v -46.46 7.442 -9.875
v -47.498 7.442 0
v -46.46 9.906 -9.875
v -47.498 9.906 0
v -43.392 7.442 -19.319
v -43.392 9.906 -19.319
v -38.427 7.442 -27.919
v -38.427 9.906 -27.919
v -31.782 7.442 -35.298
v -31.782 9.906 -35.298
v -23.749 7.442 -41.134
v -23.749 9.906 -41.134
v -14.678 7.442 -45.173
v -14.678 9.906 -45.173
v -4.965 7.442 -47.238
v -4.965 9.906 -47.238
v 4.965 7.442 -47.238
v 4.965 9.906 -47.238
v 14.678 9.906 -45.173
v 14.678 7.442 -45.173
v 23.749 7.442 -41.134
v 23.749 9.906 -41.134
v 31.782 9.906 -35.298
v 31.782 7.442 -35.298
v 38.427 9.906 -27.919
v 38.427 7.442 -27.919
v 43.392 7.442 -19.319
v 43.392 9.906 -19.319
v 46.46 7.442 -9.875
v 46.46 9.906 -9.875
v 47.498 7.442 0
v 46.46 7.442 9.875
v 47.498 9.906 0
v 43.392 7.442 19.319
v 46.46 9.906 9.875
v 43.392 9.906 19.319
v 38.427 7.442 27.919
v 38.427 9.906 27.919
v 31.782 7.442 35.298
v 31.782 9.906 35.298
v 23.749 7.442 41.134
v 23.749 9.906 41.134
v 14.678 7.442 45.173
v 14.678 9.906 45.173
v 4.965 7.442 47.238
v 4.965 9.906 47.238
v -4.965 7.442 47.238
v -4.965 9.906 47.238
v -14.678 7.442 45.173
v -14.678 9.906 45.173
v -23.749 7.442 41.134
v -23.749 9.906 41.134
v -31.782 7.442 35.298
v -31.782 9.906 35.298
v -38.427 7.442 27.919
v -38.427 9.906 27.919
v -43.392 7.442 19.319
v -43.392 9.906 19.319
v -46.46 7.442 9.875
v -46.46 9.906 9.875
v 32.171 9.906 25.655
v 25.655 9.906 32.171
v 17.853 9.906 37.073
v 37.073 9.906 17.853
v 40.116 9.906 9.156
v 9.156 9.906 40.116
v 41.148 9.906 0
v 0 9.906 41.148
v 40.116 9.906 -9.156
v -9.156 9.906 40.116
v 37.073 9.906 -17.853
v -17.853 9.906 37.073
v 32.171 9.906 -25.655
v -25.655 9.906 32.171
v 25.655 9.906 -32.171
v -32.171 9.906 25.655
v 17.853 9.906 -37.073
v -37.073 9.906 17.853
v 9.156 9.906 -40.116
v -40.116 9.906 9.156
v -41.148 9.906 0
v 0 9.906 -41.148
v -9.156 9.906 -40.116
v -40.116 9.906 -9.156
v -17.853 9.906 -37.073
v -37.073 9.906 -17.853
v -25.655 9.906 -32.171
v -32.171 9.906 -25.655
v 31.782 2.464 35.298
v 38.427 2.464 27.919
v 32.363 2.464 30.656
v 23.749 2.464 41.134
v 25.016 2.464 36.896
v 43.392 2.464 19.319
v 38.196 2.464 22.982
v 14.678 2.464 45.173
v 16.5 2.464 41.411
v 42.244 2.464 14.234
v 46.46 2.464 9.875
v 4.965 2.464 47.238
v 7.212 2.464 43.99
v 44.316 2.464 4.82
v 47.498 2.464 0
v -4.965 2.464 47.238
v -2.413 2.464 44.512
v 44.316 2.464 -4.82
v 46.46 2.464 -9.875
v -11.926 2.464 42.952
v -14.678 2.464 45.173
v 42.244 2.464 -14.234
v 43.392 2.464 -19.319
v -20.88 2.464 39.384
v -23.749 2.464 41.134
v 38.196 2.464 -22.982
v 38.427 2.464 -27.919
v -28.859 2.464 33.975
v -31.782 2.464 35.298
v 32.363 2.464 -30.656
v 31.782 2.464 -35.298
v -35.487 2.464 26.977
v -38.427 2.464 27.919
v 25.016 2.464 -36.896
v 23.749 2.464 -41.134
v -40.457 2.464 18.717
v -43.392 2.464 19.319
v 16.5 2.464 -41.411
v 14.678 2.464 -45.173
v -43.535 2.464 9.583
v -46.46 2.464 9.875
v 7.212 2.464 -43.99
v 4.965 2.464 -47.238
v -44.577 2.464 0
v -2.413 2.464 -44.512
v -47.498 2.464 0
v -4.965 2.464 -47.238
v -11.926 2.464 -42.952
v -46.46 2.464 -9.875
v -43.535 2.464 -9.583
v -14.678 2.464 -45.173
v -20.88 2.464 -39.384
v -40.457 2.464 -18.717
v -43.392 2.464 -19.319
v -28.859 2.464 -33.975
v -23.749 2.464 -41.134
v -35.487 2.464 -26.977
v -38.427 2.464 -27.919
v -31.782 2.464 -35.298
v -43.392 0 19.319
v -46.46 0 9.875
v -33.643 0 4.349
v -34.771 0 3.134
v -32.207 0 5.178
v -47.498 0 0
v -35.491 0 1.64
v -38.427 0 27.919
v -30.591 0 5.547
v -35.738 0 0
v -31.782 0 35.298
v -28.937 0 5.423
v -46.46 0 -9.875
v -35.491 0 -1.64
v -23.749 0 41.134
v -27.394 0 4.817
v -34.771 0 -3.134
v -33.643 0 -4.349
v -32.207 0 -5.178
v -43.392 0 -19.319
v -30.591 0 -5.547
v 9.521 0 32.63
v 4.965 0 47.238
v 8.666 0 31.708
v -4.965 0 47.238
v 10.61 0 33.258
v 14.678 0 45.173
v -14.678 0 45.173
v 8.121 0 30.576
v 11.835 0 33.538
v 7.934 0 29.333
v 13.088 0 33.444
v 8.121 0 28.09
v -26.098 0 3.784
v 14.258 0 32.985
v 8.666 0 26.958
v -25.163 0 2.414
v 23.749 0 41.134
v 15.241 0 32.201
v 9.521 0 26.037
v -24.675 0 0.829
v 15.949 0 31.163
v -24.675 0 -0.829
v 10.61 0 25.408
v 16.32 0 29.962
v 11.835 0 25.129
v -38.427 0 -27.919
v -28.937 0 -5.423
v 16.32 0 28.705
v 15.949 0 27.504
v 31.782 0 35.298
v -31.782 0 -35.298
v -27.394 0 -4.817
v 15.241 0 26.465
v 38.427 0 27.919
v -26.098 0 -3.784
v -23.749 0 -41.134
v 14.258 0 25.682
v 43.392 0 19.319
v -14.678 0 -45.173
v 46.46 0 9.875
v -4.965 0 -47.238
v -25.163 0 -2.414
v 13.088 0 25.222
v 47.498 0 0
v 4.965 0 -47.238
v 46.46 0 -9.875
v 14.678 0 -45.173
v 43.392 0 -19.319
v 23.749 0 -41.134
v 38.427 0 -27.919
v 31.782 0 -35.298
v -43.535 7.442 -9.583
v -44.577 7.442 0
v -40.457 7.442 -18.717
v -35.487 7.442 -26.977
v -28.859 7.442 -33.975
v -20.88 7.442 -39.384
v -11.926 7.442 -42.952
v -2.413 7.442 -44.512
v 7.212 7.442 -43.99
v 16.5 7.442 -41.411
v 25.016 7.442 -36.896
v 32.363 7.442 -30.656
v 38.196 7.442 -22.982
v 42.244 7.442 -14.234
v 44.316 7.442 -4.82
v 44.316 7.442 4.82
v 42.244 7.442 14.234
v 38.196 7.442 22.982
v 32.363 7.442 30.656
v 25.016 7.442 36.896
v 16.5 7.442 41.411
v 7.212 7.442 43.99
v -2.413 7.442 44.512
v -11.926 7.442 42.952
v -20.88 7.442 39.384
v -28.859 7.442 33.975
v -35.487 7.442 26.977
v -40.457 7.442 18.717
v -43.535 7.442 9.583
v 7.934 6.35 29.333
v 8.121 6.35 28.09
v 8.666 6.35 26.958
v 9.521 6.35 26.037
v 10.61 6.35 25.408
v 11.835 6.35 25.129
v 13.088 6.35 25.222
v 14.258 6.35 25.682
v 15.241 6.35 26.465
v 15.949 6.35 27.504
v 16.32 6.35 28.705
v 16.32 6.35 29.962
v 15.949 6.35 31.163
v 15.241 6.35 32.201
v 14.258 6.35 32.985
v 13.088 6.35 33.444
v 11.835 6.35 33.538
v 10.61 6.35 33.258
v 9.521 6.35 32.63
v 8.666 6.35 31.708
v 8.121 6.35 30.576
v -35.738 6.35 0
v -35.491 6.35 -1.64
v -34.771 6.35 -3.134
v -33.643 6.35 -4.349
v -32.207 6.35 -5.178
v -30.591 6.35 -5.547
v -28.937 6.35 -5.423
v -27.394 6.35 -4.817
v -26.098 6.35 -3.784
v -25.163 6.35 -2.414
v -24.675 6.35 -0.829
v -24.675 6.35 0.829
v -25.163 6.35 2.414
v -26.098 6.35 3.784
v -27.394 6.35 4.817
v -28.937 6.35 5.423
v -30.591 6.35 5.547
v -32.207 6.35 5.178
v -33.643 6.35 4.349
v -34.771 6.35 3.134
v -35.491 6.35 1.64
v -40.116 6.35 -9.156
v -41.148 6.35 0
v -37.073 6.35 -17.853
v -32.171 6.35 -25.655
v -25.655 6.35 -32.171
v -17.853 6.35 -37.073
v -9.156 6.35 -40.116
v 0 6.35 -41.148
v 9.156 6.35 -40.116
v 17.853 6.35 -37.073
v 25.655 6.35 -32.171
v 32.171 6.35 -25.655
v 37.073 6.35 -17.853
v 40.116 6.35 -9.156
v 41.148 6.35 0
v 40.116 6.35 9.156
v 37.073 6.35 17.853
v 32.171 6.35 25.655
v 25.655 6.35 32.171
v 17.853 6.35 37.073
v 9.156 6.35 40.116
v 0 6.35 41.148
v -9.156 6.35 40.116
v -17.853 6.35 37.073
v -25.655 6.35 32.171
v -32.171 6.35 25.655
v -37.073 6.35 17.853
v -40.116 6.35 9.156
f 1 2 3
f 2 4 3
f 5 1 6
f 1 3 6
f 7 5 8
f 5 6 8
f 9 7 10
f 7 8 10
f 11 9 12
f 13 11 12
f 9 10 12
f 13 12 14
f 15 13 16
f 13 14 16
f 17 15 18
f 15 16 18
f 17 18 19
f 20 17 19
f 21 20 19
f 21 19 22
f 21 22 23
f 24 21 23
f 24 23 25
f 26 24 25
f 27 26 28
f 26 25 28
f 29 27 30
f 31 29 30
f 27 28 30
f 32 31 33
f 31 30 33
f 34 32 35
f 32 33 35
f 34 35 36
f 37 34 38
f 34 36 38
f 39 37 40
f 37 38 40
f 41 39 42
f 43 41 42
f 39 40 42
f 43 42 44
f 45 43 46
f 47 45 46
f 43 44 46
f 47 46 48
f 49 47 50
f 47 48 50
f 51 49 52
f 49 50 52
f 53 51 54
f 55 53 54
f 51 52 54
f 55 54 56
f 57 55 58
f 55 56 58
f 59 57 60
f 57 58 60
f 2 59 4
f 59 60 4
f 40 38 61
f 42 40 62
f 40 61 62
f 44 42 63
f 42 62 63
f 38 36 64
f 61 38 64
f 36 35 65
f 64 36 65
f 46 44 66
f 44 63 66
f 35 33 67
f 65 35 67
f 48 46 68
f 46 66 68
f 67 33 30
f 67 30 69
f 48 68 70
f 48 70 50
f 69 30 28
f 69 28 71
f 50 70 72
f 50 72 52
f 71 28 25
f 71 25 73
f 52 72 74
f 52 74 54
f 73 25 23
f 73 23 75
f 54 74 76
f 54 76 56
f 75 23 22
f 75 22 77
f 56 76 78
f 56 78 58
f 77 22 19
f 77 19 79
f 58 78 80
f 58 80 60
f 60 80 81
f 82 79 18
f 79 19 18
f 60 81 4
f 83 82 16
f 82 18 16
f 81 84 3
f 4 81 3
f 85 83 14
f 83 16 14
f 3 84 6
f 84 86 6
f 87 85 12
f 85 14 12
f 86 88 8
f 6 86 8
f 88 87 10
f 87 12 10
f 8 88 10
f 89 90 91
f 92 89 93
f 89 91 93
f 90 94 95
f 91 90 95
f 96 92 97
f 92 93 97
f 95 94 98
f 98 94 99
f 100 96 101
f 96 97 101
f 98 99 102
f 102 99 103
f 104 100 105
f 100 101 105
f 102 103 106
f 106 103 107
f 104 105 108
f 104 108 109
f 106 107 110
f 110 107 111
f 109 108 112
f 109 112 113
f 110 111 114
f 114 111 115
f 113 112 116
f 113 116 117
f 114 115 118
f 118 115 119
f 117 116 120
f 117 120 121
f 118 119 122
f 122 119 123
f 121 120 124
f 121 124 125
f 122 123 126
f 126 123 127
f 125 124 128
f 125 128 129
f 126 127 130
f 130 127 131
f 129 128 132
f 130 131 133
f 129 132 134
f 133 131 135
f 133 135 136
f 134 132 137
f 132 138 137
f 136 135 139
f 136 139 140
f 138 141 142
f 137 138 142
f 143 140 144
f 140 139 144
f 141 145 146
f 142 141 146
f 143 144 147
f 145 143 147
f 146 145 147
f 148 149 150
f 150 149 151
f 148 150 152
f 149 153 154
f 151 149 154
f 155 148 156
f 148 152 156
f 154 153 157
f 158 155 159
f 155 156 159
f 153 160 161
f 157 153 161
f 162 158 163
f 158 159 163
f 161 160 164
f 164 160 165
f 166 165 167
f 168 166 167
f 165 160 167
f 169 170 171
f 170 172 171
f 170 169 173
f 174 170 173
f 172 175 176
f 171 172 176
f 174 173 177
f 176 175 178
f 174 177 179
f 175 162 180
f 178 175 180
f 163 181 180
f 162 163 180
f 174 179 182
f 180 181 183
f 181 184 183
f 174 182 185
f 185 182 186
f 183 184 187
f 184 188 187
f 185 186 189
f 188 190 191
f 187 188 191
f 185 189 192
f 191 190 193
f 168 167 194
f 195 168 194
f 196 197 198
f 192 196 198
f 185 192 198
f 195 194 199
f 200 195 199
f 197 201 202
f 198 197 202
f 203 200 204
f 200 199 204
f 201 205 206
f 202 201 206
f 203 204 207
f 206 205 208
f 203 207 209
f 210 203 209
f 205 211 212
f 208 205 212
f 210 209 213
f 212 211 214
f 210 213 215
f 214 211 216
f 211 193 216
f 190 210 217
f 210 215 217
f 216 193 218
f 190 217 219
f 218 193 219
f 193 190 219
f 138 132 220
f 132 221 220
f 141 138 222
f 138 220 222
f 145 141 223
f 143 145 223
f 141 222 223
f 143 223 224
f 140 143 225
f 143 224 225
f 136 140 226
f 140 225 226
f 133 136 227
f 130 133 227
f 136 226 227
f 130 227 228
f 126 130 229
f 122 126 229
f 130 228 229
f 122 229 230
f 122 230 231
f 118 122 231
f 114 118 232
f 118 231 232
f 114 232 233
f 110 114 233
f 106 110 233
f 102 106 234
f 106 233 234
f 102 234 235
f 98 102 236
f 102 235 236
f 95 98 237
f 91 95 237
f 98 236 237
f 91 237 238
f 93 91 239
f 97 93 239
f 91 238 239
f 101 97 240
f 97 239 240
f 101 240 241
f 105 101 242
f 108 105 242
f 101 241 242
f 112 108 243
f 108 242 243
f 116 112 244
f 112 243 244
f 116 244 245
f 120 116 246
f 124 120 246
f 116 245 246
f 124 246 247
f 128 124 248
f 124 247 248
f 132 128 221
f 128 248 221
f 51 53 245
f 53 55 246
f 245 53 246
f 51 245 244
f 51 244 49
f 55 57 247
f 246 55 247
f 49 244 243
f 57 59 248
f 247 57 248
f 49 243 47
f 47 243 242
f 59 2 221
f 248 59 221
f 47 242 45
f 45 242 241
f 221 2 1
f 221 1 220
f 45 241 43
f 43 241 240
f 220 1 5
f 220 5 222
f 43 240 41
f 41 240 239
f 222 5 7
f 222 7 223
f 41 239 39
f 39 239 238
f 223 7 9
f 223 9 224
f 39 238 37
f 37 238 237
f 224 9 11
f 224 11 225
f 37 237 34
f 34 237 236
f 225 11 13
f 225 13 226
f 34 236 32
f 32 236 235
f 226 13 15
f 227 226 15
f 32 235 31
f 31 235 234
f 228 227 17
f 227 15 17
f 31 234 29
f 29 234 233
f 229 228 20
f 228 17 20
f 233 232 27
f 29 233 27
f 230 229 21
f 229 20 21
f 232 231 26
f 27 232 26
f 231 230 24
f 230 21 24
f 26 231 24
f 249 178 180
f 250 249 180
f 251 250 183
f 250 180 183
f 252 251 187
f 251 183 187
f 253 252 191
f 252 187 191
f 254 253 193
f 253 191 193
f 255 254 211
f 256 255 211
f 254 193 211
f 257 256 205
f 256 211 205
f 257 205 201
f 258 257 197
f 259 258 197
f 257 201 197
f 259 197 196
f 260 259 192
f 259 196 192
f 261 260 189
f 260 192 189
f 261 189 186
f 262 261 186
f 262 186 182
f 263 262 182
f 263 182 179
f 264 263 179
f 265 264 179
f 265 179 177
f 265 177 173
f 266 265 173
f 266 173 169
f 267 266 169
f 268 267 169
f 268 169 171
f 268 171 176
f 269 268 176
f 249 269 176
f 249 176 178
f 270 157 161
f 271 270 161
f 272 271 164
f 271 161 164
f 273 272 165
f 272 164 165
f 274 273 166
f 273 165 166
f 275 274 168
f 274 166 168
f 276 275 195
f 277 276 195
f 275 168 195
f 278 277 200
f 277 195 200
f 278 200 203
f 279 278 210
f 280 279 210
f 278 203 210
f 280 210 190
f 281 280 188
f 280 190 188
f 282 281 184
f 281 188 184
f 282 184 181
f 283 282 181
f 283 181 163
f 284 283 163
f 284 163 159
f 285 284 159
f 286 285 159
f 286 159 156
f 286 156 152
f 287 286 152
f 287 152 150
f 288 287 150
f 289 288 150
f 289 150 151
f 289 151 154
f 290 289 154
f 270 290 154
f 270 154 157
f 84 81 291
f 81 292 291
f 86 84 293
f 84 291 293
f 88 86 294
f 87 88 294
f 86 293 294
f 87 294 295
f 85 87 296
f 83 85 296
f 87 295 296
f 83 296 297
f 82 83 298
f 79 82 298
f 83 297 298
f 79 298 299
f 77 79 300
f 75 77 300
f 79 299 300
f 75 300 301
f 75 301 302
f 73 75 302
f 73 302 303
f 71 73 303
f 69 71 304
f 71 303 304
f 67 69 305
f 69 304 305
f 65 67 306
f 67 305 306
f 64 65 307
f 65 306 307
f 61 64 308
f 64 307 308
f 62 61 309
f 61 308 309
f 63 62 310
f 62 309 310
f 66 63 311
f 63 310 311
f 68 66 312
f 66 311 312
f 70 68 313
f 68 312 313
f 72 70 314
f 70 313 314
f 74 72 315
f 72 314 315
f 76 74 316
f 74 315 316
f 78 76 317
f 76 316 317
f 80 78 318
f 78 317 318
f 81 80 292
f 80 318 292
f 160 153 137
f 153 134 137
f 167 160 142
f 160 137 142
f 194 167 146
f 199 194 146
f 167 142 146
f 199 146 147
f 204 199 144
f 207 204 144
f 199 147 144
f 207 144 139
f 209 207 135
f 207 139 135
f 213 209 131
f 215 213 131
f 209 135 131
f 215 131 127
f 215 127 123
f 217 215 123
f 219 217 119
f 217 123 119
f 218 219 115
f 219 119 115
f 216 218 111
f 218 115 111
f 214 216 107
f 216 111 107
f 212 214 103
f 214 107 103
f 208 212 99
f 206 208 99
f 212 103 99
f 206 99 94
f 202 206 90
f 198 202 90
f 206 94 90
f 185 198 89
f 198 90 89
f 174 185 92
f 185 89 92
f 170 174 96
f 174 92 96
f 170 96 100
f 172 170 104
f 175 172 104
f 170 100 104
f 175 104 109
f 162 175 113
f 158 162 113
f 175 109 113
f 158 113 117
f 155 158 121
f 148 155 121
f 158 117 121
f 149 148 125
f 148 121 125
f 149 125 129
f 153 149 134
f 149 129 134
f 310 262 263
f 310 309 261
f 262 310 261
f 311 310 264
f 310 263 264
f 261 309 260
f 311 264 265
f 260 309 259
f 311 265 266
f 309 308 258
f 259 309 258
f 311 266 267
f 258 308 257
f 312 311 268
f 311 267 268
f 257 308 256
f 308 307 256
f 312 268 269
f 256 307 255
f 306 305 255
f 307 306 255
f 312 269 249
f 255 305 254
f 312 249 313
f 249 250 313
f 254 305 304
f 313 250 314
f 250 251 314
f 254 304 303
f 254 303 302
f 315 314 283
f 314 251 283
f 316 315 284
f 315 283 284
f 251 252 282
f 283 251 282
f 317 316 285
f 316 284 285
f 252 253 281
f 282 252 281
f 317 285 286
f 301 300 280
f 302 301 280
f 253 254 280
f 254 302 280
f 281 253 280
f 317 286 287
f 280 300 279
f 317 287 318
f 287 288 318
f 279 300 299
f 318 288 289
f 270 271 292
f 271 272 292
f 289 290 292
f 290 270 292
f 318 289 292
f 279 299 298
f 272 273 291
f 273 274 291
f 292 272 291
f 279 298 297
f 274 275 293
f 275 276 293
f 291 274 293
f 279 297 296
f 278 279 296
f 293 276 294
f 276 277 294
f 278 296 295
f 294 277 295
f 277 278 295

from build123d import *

# Parameters (mm, degrees)
PIPE_TAP_DRILL_FOR_1_4_TAP1_D = 11.1252
PIPE_TAP_DRILL_FOR_1_8_TAP1_D = 8.4328
SKETCH6_R                     = 6.35
BOSS_EXTRUDE1_DEPTH           = 6.35


with BuildPart() as part:
    # Sketch1 → Revolve1 (revolve)
    with BuildSketch(Plane.XY, mode=Mode.PRIVATE) as revolve1_sk:
        Polygon((0, 0), (47.498, 0), (47.498, 2.4638), (44.577, 2.4638), (44.577, 7.4422), (47.498, 7.4422), (47.498, 9.906), (41.148, 9.906), (41.148, 6.35), (0, 6.35), align=None)
    revolve(revolve1_sk.sketch.rotate(Axis((0, 48.192213231, 0), (0, -1, 0)), 180), axis=Axis((0, 48.192213231, 0), (0, -1, 0)))

    # Pipe Tap Drill for 1/4 Tap1 (through all)
    with Locations(Plane(origin=(0, 6.35, 0), x_dir=(1, 0, 0), z_dir=(0, 1, 0))):
        with Locations((0, 0), (-30.1752, 0)):
            Hole(PIPE_TAP_DRILL_FOR_1_4_TAP1_D / 2)

    # Pipe Tap Drill for 1/8 Tap1 (through all)
    with Locations(Plane(origin=(0, 6.35, 0), x_dir=(1, 0, 0), z_dir=(0, 1, 0))):
        with Locations((12.150198978, -29.333175157)):
            Hole(PIPE_TAP_DRILL_FOR_1_8_TAP1_D / 2)

    # Sketch6 → Boss-Extrude1 (add)
    with BuildSketch(Plane(origin=(0, 6.35, 0), x_dir=(1, 0, 0), z_dir=(0, 1, 0))):
        Circle(SKETCH6_R)
    extrude(amount=-BOSS_EXTRUDE1_DEPTH)


solid = part.part
